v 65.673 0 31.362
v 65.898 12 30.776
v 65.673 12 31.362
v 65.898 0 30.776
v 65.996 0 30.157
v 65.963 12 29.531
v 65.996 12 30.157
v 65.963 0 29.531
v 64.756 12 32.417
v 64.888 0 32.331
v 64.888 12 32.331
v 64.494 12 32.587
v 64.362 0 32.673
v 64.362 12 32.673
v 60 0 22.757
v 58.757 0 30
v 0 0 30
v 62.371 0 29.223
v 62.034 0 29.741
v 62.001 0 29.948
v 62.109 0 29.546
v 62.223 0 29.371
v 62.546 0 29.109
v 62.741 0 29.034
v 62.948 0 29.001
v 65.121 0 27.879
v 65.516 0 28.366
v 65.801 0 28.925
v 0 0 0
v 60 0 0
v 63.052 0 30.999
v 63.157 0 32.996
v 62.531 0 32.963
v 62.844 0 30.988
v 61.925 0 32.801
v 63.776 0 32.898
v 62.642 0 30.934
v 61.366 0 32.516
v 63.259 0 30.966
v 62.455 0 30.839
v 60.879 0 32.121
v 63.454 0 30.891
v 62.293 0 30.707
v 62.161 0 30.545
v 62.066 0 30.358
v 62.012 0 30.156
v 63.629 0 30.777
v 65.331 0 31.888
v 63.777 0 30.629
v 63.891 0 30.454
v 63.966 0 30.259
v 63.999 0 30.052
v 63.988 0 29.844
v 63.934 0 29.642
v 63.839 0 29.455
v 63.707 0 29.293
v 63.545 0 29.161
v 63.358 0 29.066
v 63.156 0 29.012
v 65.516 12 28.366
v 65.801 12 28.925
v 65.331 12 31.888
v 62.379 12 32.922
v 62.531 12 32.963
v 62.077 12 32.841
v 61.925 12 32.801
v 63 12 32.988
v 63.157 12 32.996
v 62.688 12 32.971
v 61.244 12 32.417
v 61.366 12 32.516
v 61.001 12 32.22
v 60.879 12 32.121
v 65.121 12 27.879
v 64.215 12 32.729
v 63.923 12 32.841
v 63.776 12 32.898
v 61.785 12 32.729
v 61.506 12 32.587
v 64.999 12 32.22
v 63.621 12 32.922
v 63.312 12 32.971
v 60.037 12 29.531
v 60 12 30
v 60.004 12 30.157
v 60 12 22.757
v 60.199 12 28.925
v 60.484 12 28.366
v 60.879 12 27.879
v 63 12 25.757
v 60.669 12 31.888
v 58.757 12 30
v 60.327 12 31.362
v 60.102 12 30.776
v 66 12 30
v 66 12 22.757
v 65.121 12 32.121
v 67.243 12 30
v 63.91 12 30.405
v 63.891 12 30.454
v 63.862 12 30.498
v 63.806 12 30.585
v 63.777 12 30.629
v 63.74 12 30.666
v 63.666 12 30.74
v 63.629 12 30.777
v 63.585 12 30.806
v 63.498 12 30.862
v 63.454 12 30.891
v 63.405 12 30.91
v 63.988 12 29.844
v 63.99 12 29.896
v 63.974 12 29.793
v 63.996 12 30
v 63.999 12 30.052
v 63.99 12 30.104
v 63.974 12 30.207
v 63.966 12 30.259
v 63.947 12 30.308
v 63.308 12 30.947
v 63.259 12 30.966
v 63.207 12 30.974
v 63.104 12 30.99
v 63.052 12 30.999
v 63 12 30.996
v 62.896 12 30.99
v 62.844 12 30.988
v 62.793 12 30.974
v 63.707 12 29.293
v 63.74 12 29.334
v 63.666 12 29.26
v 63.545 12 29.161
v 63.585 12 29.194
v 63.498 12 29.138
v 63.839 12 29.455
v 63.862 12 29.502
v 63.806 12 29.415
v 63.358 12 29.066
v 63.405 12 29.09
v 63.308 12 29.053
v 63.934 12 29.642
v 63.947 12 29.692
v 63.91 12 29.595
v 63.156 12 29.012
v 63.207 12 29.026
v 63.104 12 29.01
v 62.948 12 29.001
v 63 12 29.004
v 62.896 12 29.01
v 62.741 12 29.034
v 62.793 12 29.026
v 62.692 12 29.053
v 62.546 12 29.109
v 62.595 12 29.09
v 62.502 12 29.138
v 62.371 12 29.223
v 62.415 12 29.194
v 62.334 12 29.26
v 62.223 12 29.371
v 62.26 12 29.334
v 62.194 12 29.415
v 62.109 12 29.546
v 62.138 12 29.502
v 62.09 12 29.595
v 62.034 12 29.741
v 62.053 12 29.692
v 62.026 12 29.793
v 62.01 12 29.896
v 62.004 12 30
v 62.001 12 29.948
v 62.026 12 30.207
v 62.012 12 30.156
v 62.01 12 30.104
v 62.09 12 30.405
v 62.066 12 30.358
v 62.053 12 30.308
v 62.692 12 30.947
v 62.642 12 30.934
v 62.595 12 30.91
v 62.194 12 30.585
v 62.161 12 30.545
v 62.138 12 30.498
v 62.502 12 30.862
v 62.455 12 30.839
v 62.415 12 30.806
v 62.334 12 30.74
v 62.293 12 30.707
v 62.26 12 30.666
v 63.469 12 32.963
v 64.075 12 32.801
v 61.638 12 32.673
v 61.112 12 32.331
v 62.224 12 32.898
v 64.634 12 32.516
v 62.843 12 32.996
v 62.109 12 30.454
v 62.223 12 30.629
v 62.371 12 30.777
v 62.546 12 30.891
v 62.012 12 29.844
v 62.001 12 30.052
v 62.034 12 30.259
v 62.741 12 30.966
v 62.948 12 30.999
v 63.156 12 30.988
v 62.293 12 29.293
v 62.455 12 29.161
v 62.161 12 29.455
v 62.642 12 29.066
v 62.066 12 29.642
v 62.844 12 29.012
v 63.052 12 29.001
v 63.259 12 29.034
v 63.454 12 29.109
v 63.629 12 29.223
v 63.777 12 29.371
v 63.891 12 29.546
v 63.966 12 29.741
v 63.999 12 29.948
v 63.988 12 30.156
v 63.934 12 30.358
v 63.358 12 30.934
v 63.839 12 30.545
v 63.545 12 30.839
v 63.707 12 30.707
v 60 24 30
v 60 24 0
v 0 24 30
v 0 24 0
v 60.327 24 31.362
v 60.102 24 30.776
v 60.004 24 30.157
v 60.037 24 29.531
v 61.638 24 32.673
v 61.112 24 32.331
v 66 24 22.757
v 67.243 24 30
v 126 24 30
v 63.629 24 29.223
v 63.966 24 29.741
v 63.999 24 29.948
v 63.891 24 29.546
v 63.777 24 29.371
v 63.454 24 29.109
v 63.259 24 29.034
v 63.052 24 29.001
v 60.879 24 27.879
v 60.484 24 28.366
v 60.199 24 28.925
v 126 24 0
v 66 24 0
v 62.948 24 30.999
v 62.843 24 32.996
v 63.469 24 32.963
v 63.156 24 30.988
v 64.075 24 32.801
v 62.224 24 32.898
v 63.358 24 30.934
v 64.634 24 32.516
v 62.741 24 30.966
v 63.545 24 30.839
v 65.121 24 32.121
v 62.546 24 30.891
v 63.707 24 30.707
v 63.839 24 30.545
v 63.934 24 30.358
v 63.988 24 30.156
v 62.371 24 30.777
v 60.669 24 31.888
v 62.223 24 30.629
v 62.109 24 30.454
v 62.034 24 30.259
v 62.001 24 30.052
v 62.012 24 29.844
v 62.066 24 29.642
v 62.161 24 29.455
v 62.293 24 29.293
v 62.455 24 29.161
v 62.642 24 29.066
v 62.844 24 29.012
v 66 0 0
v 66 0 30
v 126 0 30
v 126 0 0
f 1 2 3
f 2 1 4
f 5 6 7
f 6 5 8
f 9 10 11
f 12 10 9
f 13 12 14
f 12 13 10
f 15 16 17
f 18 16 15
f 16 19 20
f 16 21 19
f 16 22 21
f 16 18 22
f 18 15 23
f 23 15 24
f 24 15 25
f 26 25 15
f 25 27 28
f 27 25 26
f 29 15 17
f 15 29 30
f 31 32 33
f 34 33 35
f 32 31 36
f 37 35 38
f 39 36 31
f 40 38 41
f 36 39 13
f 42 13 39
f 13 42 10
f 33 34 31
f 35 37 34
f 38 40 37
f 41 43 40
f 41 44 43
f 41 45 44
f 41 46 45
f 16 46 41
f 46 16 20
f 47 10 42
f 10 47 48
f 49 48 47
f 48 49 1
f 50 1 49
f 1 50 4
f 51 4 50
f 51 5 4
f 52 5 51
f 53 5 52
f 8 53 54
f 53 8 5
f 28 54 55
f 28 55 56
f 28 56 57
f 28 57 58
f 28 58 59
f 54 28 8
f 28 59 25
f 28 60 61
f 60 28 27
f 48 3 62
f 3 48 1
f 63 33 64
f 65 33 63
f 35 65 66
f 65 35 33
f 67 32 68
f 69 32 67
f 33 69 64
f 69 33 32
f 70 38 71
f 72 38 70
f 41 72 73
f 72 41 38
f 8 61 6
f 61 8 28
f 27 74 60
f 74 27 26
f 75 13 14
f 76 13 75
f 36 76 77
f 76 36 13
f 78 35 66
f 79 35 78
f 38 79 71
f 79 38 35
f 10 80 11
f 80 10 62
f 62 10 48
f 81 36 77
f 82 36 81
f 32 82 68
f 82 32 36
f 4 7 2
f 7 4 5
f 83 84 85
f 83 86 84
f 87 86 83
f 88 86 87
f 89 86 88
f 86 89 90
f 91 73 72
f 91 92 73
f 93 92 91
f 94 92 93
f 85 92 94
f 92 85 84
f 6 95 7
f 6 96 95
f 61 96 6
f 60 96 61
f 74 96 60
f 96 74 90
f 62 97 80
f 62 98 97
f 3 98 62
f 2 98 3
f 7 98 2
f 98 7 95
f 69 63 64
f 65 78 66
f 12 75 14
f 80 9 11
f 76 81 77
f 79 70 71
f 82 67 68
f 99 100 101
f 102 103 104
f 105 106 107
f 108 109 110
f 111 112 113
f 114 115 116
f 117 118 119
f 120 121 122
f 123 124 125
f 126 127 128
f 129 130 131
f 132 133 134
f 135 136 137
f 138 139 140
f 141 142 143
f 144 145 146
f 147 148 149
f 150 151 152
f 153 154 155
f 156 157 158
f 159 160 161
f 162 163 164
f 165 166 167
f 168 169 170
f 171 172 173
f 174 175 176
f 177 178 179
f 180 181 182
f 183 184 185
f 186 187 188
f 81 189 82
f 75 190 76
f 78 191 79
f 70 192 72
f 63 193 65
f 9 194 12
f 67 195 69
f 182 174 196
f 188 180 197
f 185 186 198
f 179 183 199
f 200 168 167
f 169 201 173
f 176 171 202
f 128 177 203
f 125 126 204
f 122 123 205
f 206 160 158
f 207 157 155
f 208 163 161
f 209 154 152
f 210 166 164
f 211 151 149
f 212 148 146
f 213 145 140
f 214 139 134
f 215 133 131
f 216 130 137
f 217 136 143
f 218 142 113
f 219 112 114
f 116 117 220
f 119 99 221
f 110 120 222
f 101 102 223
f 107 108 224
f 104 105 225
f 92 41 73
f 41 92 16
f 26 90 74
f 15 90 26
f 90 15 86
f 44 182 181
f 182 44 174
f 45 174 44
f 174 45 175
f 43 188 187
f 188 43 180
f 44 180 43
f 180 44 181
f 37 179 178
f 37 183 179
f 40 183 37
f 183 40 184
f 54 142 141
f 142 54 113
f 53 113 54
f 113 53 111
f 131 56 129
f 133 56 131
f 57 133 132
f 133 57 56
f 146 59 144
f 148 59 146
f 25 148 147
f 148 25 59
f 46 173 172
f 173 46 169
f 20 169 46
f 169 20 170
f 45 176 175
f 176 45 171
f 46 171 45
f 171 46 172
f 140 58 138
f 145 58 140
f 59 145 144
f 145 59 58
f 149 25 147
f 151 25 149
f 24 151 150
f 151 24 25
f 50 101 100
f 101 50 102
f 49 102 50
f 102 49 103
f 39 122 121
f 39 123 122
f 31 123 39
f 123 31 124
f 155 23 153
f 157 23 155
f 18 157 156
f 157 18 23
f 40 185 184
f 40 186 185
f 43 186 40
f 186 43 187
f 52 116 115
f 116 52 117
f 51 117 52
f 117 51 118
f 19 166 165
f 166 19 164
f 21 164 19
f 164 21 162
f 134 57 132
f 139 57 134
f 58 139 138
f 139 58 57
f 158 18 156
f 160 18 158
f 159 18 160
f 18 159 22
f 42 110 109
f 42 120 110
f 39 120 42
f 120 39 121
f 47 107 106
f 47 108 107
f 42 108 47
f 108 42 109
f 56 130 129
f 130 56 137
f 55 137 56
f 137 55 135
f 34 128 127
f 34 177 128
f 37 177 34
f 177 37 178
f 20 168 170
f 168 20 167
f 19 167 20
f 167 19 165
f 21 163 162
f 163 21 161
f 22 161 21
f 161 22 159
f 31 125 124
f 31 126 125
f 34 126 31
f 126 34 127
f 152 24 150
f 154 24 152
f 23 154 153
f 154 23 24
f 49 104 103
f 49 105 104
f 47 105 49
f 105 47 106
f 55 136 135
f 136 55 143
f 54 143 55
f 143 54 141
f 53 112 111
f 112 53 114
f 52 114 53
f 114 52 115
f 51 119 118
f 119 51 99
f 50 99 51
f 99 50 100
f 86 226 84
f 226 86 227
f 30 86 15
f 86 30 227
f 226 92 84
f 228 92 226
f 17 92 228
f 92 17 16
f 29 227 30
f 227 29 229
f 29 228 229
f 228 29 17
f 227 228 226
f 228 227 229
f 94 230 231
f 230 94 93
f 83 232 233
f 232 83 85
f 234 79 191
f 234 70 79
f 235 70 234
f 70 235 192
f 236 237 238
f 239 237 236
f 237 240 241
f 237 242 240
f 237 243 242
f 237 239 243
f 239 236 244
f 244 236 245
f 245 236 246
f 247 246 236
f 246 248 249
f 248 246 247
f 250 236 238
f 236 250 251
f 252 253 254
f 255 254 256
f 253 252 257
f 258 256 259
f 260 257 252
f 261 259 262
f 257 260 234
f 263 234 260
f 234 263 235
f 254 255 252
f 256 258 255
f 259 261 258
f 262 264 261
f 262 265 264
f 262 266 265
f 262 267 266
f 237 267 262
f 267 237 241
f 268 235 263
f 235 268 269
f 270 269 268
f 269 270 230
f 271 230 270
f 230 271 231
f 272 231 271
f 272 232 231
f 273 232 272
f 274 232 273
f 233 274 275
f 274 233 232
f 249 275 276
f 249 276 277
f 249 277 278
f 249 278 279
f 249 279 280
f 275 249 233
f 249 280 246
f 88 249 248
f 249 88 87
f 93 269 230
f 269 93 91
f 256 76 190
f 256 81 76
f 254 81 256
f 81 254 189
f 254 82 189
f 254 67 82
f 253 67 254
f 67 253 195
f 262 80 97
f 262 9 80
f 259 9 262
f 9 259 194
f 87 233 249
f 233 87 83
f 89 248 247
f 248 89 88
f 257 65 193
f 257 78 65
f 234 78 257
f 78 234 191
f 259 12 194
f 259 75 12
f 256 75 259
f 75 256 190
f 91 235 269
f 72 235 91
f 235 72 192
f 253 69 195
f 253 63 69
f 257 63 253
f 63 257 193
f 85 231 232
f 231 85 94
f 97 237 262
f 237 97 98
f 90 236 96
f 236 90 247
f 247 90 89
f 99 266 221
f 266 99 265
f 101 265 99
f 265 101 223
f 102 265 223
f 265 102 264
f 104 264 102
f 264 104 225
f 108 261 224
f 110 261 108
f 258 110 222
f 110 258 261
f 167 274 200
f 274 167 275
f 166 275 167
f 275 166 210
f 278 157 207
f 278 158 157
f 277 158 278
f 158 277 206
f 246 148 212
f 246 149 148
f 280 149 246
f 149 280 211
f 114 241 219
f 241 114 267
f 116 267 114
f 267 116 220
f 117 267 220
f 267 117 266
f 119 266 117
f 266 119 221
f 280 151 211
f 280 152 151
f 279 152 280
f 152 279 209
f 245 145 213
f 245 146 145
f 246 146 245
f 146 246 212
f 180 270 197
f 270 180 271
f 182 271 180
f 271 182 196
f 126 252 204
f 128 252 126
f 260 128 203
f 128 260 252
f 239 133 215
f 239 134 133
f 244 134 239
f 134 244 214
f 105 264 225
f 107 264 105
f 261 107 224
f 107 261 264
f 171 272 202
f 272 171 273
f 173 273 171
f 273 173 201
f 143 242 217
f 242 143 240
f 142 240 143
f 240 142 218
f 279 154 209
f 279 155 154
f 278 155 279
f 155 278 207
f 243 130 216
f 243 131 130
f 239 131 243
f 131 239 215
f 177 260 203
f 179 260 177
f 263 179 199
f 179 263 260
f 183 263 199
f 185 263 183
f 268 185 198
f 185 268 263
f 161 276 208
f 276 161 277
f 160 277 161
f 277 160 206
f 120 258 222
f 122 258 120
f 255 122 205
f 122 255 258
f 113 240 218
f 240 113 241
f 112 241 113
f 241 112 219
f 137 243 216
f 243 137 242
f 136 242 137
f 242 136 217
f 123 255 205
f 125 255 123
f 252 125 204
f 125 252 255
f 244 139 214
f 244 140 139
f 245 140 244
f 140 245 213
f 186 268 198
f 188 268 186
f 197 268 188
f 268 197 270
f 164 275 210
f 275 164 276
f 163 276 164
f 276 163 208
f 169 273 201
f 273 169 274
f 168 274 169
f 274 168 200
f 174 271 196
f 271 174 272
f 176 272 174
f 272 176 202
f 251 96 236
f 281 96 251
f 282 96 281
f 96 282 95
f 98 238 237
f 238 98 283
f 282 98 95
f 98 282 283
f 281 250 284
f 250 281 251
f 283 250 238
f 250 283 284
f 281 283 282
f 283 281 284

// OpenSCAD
//hinge
$fn=30;
length=12;
diameter=6;
axleDiameter=2;
stemLength=10;
numberPairs=5;
baseWidth=25;

module hinge() {
    translate([3,0,0]) rotate([0,-135,0]) {
        difference() {
        union() {
            rotate([90,0,0]) cylinder(h=length,d=diameter,center=true);
            translate([0,0,stemLength/2]) cube([diameter,length,stemLength],center=true);
        }
        union() {
              translate([1,0,stemLength*1.00]) rotate([0,45,0]) cube([diameter*2,diameter*3,diameter], center=true);
              rotate([90,0,0]) cylinder(h=length+2,d=axleDiameter,center=true);
        }
    }
}
}

*hinge();



color("red") {
cube([60,length*2,30]);
translate([60,length/2,30]) hinge();
}

module base() {
color("blue") {
cube([60,length*2,30]);
translate([60,length/2,30]) hinge();
}
}

module lid() {
translate([0,length*2,60]) rotate([180,0,0]) base();
}

*lid();

translate([120+6,0,60]) rotate([0,180,0]) lid();
